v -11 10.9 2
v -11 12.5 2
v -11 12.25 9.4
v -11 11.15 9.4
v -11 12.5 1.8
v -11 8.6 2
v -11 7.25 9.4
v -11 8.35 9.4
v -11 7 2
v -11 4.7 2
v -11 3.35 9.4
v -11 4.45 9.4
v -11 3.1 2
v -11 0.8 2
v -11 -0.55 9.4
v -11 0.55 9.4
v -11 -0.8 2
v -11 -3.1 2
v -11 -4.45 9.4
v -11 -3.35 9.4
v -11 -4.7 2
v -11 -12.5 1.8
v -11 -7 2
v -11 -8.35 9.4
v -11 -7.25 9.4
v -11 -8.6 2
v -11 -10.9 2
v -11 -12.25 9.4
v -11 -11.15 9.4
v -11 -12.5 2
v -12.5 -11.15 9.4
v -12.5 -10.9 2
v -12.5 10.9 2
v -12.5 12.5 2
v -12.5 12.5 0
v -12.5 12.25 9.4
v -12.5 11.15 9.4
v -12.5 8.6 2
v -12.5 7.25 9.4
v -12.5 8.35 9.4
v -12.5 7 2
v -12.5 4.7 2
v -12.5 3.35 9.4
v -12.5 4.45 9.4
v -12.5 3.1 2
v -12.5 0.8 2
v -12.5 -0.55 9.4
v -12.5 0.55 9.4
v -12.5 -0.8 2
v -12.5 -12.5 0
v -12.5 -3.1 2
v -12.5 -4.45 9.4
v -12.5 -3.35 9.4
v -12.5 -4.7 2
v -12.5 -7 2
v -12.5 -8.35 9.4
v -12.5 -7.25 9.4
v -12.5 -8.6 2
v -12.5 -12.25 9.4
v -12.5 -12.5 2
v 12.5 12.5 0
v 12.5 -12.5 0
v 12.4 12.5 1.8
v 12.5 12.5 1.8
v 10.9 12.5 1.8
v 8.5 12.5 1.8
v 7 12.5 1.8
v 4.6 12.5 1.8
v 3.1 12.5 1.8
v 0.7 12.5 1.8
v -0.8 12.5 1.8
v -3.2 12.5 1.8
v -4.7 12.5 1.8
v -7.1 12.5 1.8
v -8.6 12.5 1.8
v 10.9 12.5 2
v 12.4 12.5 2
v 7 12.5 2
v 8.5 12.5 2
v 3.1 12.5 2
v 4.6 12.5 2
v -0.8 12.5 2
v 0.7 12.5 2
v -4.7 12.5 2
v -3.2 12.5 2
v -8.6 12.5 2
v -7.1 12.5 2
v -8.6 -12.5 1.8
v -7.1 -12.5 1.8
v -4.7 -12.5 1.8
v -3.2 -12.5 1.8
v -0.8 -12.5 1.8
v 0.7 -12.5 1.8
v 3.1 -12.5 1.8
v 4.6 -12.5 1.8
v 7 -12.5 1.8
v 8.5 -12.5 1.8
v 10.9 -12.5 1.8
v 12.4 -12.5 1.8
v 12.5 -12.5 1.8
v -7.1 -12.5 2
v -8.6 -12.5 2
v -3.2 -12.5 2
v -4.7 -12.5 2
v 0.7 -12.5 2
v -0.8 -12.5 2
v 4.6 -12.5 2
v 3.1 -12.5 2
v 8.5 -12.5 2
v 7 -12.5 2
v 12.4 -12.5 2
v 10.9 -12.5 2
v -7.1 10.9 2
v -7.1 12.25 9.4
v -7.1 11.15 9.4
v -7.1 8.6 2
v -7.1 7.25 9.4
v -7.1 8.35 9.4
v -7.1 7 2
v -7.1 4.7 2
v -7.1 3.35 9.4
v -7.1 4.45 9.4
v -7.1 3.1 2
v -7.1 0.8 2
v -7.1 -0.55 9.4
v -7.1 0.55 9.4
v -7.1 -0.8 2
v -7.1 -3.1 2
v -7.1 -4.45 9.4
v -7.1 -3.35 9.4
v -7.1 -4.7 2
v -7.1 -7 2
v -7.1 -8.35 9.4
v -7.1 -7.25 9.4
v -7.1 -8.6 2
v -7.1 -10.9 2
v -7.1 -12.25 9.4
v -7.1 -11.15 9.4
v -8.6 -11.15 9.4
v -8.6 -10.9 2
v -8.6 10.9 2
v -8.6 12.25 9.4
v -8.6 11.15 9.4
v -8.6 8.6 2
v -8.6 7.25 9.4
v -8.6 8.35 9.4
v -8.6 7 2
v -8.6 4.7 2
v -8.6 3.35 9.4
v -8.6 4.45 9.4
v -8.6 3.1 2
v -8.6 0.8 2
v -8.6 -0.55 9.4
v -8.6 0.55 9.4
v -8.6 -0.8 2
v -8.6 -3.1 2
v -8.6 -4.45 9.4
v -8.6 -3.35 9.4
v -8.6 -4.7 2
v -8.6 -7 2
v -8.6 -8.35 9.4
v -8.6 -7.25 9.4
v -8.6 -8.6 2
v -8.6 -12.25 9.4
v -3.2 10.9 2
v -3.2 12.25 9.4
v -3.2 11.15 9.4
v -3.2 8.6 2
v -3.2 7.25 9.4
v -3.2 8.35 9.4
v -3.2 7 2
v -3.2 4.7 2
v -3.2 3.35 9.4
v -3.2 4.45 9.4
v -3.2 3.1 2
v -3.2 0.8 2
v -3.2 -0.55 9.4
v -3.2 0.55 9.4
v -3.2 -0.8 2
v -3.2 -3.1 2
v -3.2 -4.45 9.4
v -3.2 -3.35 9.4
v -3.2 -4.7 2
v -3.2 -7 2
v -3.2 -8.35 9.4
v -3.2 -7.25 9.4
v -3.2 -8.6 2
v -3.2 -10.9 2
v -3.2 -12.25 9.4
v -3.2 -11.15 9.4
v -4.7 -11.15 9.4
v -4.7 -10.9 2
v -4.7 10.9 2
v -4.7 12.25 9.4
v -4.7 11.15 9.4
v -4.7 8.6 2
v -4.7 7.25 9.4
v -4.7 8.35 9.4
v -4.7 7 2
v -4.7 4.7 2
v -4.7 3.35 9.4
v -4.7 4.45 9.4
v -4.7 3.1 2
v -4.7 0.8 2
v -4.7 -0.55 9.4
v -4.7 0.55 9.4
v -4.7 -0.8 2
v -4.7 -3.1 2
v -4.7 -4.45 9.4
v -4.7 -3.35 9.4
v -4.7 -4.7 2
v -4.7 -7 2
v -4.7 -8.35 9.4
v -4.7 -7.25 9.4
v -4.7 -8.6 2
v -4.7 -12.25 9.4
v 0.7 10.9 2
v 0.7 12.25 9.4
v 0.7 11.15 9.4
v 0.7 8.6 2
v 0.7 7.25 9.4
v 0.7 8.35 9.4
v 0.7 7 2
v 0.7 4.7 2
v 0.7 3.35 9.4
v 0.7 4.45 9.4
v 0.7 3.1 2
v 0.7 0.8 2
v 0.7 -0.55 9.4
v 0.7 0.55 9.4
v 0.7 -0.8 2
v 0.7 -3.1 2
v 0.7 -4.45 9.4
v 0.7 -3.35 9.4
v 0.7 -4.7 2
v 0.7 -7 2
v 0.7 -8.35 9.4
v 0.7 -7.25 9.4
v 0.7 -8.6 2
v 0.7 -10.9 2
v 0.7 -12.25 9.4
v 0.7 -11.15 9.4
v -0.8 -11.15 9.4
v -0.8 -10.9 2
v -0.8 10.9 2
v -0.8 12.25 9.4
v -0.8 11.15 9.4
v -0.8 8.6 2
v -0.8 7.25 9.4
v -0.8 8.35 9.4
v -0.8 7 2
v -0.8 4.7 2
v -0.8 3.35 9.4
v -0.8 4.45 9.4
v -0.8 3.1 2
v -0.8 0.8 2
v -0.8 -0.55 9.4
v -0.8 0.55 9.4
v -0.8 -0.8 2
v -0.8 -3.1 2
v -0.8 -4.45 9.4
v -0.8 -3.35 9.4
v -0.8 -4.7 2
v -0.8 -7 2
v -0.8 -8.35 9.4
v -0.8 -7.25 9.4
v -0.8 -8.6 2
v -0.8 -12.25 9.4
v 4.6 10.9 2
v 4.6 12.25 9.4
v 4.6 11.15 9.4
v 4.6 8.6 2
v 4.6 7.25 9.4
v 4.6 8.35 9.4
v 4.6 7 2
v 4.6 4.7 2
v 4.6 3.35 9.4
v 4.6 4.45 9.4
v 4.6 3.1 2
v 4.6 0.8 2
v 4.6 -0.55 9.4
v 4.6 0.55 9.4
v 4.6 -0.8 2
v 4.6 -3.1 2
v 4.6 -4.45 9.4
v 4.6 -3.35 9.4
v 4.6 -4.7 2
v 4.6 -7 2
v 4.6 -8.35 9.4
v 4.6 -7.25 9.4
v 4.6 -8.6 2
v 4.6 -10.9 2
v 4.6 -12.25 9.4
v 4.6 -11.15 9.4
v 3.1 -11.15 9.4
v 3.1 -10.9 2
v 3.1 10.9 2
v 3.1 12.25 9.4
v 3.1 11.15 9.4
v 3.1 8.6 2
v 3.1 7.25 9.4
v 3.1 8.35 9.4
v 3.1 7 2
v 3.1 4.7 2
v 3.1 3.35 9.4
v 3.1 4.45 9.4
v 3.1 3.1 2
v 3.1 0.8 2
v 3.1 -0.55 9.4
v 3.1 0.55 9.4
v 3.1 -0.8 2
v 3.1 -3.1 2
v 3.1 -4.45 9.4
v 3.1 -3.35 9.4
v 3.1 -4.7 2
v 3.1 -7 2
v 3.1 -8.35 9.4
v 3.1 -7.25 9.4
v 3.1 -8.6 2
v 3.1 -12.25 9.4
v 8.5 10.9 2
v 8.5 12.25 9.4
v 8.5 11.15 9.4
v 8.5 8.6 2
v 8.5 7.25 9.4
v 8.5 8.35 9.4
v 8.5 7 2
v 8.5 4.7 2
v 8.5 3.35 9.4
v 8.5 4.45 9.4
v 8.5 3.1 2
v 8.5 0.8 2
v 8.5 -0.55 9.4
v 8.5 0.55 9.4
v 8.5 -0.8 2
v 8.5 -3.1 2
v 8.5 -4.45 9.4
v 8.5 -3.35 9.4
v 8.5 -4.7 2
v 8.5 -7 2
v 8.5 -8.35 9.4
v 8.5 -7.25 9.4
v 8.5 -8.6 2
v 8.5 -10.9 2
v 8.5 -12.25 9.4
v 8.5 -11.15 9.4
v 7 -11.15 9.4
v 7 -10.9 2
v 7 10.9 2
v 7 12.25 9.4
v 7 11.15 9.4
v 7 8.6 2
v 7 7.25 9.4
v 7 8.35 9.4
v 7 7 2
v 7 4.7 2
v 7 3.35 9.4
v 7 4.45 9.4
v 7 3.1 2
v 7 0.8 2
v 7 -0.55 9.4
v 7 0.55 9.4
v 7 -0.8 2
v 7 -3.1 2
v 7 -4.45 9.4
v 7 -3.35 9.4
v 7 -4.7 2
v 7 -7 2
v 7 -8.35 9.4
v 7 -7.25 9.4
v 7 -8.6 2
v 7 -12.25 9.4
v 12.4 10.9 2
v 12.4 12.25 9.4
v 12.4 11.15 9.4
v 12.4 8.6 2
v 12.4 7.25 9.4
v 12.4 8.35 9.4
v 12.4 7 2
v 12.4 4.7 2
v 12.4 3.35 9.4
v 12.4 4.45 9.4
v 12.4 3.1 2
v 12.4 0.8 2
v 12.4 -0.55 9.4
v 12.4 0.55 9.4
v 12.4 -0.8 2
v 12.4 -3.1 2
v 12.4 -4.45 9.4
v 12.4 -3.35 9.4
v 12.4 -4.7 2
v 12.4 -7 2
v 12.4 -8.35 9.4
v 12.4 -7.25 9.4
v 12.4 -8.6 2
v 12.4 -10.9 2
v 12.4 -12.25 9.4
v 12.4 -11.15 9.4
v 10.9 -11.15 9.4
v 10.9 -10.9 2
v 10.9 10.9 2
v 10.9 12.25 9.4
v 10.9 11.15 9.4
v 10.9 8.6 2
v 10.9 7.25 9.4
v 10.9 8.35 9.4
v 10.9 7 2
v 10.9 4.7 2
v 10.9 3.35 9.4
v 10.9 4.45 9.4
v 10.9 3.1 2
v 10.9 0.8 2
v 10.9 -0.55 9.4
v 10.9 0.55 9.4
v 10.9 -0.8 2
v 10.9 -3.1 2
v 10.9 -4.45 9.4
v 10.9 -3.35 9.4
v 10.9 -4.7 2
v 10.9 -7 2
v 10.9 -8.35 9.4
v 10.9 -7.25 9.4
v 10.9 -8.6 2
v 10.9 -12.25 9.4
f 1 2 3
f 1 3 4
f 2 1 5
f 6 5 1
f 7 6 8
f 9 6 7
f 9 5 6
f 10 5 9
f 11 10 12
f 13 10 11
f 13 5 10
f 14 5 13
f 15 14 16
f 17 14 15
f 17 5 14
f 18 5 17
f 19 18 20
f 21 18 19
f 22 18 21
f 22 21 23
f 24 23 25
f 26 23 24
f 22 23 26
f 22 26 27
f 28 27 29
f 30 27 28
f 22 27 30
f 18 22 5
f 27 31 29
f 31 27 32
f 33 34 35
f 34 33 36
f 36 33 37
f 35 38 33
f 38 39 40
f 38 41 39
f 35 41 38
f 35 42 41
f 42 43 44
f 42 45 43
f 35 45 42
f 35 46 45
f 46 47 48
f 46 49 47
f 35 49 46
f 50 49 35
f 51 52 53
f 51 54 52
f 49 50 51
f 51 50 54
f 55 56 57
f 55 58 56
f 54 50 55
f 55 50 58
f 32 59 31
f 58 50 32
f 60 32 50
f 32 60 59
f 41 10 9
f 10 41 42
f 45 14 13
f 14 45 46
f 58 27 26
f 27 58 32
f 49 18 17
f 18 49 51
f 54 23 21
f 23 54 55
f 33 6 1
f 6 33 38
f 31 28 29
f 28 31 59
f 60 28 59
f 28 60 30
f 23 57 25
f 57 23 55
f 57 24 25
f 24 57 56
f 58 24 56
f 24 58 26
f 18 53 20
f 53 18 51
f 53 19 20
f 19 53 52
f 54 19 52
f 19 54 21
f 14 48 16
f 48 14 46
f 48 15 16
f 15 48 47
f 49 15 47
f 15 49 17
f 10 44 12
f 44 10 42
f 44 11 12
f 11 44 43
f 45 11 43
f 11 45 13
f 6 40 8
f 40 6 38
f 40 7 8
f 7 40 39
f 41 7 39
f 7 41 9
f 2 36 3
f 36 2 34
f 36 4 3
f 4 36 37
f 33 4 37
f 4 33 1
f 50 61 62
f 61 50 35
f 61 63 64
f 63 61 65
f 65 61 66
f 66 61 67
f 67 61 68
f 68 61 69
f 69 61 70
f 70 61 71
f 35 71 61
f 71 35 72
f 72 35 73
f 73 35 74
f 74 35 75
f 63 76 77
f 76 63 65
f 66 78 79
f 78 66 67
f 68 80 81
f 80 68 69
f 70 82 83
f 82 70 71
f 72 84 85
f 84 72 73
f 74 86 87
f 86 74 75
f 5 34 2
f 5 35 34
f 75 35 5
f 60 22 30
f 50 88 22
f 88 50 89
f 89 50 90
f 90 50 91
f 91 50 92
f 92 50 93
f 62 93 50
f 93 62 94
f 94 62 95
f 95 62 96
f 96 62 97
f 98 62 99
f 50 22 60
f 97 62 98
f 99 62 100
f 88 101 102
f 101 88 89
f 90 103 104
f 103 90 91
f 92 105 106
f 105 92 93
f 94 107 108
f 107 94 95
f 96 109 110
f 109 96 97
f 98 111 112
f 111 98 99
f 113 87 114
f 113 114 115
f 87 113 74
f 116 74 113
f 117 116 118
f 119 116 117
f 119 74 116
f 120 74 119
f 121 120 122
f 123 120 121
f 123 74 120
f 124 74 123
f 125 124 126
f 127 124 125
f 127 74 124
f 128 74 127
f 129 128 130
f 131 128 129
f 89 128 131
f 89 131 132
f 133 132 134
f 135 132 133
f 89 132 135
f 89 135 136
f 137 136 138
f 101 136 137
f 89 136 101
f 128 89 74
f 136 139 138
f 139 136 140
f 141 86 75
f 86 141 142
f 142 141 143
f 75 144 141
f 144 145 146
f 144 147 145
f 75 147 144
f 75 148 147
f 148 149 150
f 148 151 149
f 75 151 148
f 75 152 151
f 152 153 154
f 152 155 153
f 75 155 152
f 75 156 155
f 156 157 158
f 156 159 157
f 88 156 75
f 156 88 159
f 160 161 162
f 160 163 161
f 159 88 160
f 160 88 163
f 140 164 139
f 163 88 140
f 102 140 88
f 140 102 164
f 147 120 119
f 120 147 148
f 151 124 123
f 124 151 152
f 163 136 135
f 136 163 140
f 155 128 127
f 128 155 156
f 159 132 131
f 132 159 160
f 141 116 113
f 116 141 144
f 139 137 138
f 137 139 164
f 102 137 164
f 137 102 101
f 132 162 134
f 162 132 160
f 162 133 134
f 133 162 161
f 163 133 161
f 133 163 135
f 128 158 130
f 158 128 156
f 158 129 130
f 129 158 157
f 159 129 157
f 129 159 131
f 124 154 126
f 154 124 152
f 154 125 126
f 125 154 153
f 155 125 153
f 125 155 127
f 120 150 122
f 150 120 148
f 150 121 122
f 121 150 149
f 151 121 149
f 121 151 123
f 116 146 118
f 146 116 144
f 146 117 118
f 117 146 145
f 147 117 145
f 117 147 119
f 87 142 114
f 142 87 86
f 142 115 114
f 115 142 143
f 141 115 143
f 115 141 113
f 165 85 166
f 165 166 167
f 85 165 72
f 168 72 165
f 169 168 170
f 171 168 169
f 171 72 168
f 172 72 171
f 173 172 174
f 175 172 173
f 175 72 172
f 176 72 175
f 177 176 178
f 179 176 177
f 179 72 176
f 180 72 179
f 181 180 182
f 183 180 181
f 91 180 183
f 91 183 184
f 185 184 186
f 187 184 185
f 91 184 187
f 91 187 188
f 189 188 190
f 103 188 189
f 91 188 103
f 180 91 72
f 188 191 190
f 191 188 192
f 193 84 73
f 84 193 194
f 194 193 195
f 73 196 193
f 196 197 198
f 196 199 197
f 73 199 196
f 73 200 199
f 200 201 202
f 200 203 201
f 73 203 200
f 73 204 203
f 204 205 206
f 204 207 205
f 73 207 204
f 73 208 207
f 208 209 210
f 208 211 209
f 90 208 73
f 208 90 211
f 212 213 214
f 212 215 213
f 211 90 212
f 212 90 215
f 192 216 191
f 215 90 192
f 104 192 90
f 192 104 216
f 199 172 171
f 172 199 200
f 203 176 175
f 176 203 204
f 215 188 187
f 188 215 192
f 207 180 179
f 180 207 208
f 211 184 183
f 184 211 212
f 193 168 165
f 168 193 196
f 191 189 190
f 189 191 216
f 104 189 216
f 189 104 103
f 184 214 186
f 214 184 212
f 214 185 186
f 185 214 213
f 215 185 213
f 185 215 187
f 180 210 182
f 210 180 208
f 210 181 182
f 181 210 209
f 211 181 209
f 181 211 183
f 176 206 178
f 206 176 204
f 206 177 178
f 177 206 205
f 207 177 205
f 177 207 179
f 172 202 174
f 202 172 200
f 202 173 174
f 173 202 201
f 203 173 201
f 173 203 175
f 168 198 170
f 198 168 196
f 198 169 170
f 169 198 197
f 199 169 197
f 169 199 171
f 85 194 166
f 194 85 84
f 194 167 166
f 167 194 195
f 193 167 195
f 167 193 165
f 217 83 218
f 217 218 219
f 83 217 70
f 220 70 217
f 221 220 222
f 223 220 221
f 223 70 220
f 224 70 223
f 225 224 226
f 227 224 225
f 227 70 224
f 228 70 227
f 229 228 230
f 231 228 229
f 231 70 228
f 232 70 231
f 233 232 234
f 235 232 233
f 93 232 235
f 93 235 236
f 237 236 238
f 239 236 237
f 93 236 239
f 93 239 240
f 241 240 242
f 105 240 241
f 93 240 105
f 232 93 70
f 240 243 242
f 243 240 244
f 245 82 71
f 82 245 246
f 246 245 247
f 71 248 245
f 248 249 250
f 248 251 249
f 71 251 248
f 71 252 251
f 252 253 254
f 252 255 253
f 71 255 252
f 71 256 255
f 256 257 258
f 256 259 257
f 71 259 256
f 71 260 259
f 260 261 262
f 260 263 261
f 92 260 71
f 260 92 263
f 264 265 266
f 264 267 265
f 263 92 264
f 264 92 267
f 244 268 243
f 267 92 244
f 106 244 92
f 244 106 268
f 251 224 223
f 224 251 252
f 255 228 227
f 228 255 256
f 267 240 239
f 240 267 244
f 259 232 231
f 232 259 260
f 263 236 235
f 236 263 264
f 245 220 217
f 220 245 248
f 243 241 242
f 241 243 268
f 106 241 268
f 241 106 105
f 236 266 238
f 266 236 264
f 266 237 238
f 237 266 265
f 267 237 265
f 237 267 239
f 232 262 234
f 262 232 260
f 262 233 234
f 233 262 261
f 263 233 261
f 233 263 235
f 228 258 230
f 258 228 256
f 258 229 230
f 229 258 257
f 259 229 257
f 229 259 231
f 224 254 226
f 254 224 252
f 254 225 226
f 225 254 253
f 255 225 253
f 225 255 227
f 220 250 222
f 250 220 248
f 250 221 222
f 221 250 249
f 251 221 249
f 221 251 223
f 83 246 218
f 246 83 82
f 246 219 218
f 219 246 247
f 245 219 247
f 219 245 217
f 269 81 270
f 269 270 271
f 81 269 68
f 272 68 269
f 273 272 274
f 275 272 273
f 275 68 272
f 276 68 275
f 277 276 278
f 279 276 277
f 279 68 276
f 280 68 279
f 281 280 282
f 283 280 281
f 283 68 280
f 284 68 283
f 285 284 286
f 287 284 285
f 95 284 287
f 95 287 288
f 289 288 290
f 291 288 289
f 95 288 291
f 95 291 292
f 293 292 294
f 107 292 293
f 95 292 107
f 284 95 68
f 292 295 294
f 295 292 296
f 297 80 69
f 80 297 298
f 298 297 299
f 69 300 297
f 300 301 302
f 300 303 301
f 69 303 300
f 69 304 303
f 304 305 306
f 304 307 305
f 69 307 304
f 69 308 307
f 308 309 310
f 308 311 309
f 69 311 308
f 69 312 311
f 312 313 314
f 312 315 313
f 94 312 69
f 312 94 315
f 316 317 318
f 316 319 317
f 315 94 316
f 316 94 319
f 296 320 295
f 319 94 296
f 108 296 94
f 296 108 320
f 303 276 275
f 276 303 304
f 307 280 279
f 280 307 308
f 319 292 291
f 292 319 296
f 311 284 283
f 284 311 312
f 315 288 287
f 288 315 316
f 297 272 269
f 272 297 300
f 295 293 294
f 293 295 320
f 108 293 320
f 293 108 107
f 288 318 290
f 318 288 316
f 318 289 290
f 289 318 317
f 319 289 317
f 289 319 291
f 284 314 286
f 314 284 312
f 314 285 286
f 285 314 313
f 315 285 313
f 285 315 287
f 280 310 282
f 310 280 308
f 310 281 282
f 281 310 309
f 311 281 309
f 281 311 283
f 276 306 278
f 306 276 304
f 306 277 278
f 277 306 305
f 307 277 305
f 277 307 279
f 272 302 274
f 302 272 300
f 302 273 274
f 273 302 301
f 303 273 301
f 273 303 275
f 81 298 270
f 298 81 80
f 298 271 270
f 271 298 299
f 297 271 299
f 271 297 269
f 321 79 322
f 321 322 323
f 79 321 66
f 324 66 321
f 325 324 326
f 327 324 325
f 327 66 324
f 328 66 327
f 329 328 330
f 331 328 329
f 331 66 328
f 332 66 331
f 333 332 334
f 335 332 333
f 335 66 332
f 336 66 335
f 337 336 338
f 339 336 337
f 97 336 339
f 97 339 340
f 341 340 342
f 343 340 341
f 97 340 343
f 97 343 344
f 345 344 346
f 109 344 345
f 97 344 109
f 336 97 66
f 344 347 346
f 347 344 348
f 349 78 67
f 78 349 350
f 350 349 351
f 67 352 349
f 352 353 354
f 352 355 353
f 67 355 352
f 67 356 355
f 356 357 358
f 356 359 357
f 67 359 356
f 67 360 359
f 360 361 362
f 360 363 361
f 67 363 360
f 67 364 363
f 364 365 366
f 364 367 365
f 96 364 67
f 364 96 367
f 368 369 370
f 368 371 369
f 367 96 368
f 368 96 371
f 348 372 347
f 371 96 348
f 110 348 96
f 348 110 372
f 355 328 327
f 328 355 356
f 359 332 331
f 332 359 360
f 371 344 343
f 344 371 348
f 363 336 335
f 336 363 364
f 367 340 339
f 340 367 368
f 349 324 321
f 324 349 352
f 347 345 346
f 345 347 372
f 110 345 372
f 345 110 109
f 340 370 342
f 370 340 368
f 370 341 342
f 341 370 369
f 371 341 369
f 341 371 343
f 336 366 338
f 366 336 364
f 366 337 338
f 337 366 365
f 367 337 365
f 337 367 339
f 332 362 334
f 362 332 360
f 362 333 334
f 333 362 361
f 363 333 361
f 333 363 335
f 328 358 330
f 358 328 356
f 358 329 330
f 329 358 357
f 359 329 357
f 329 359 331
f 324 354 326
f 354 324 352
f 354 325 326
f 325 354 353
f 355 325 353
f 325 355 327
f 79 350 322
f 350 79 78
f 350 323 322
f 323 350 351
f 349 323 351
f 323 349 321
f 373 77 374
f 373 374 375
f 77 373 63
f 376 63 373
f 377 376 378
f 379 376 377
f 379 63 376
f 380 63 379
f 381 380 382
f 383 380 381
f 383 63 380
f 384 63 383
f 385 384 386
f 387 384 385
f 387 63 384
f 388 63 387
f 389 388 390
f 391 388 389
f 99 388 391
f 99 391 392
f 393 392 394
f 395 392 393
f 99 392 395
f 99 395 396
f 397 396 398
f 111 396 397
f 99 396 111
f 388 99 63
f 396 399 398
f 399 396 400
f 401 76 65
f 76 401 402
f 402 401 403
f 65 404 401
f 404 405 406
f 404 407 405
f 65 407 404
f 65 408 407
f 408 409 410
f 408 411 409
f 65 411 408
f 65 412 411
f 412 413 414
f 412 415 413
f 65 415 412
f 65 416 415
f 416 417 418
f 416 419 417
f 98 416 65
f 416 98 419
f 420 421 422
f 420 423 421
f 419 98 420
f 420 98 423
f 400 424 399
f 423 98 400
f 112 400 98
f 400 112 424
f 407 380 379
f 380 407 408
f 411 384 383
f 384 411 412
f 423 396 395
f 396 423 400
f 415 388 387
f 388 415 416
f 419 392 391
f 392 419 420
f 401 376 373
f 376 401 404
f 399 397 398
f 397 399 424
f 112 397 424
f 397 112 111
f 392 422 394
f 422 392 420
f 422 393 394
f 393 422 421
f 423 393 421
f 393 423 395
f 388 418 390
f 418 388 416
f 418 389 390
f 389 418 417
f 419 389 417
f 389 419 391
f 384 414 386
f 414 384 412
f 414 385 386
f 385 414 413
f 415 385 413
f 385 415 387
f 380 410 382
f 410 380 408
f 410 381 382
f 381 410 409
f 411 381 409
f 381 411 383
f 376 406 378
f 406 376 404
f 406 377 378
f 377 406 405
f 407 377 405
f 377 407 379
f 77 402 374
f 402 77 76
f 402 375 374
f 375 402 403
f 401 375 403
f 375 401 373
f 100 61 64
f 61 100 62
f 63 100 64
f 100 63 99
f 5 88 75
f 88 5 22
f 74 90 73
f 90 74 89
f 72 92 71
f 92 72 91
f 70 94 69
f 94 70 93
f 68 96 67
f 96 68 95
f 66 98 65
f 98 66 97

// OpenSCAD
// file: ../../lib/geometric.scad
/*
    ~Geometric Lib
    
    Variety of geometric parts
*/

/*
    On plane cube
    
    Cube that is centered in X and Y and rests on the XY plane
    
    size - as cube
*/
module tcube(size){
    translate([0,0,size[2]/2]) cube(size, true);
}

/*
    Square based frustrated pyramid

    Centered on X and Y, rests on the XY plane

    w - Width in X
    d - Depth in Y
    h - Height in Z
    ratio - Ratio of size of the tip face to the base face
*/
module sq_pyr(w, d, h, ratio){
    resize([w,d,h]) rotate([0,0,45]){
        cylinder(h, d1=1, d2=ratio, $fn=4);
    }
}

/*
    Rounded cornered box

    Centered on X and Y, rests on the XY plane

    w - Width in X
    d - Depth in Y
    h - Height in Z
    cr - Corner ratio
*/
module rounded_box(w,d,h,cr){
    translate([0,0,h/2]) {
        minkowski() {
            cube([w-2*cr, d-2*cr, h/2], true);
            cylinder(h/2, cr, cr, true, $fn=12);
        }
    }
}

module wedge(w,d,h){
    resize([w,d,h])
      translate([1,0,0])
        rotate([0,-90,0])
          linear_extrude(1)
            polygon([[0,0],[0,1],[1,0]]);
}


module fwedge(w,d,h,td){
    wedge_d = (d-td)/2;
    translate([0,wedge_d,0]){
        translate([0,td,0])
          wedge(w,wedge_d,h);
        cube([w,td,h]);
        mirror([0,1,0])
          wedge(w,wedge_d,h);
    }
}
// main file
use <../../lib/geometric.scad>

W = 25.0;
D = 25.0;
H_BASE = 1.8;
H_PINS = 2.0;
H_TOTAL = 9.4;

PIN_BASE_W = 1.6;
PIN_TIP_W = 1.1;
PIN_D = 1.5;
PIN_STEP = 2.4;
PINS_X = 7;
PINS_Y = 7;

module row(){
    cube([PIN_D,W,H_PINS]);
    for (i=[0:(D-PIN_BASE_W)/(PINS_Y-1):D-PIN_BASE_W]){
        translate([0,i,H_PINS])
          fwedge(PIN_D, PIN_BASE_W, H_TOTAL-H_PINS, PIN_TIP_W);
    }
}
render(){
    translate([-W/2, -D/2, 0]){
        for (i=[0:PIN_D+PIN_STEP:W]){
            translate([i,0,0])
              row();
        }
        cube([W,D,H_BASE]);
    }
}
